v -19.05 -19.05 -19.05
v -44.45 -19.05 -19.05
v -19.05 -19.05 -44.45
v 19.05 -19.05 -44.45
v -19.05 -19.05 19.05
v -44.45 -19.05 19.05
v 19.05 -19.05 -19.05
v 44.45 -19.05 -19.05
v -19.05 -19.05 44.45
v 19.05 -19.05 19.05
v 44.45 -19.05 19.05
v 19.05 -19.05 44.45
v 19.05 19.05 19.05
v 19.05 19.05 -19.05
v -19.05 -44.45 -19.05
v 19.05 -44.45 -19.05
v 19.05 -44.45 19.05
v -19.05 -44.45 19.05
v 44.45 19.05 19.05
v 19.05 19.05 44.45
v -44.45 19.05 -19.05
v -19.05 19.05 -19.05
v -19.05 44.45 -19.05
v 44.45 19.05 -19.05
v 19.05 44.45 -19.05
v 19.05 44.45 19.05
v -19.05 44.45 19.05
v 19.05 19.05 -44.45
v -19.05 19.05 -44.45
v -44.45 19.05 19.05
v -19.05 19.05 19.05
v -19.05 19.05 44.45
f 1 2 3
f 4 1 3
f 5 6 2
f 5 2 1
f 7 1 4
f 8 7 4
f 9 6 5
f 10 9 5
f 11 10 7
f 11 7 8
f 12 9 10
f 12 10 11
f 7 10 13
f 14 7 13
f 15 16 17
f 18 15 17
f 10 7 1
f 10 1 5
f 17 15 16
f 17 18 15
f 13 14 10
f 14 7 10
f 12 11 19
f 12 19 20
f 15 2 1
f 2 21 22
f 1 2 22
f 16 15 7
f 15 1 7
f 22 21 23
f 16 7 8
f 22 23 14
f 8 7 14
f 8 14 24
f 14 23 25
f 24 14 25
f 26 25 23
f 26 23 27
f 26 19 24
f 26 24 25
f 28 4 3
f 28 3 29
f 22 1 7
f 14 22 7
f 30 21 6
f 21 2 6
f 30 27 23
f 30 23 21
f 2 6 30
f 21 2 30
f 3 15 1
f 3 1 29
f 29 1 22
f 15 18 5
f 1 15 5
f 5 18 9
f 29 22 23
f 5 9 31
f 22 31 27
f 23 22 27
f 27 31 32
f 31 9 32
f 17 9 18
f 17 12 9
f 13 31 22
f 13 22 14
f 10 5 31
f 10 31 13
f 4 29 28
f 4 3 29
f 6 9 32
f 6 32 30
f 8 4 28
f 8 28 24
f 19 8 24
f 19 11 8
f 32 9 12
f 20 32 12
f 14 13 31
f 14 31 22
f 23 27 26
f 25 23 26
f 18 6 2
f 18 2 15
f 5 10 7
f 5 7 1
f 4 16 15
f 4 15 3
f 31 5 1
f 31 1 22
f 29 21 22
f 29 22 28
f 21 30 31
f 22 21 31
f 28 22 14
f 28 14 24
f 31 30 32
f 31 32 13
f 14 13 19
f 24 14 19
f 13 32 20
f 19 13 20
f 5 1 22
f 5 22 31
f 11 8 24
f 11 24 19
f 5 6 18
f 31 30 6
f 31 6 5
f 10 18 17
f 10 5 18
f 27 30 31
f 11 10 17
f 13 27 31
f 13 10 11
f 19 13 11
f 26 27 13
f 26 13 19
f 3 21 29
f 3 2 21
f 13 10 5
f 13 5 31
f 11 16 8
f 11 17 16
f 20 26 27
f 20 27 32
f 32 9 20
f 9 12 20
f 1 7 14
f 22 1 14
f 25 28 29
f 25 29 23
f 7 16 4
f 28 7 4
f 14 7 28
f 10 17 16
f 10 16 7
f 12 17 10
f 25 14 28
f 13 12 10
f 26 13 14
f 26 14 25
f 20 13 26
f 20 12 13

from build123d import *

# Parameters (mm, degrees)
F0_W     = 38.1
F0_H     = 25.4
F0_W_2   = 25.4
F0_H_2   = 38.1
F3_DEPTH = 19.05
F1_W     = 38.1
F1_H     = 25.4
F1_W_2   = 25.4
F1_H_2   = 38.1
F4_DEPTH = 19.05
F2_W     = 38.1
F2_H     = 25.4
F2_W_2   = 25.4
F2_H_2   = 38.1
F5_DEPTH = 19.05


with BuildPart() as f3:
    # F0 (on Front) → F3 (new body, symmetric)
    with BuildSketch(Plane.XZ):
        with Locations((0, 31.75)):
            Rectangle(F0_W, F0_H)
        Polygon((-19.05, 19.05), (-19.05, 44.45), (-44.45, 19.05), align=None)
        Polygon((44.45, 19.05), (19.05, 44.45), (19.05, 19.05), align=None)
        with Locations((-31.75, 0)):
            Rectangle(F0_W_2, F0_H_2)
        with Locations((31.75, 0)):
            Rectangle(F0_W_2, F0_H_2)
        with Locations((0, -31.75)):
            Rectangle(F0_W, F0_H)
        Polygon((-19.05, -44.45), (-19.05, -19.05), (-44.45, -19.05), align=None)
        Polygon((44.45, -19.05), (19.05, -19.05), (19.05, -44.45), align=None)
    extrude(amount=F3_DEPTH, both=True)


with BuildPart() as f4:
    # F1 (on Right) → F4 (new body, symmetric)
    with BuildSketch(Plane.YZ):
        with Locations((0, 31.75)):
            Rectangle(F1_W, F1_H)
        Polygon((44.45, 19.05), (19.05, 44.45), (19.05, 19.05), align=None)
        Polygon((-19.05, 19.05), (-19.05, 44.45), (-44.45, 19.05), align=None)
        with Locations((31.75, 0)):
            Rectangle(F1_W_2, F1_H_2)
        with Locations((-31.75, 0)):
            Rectangle(F1_W_2, F1_H_2)
        Polygon((44.45, -19.05), (19.05, -19.05), (19.05, -44.45), align=None)
        with Locations((0, -31.75)):
            Rectangle(F1_W, F1_H)
        Polygon((-19.05, -44.45), (-19.05, -19.05), (-44.45, -19.05), align=None)
    extrude(amount=F4_DEPTH, both=True)


with BuildPart() as f5:
    # F2 (on Top) → F5 (new body, symmetric)
    with BuildSketch(Plane.XY):
        with Locations((0, -31.75)):
            Rectangle(F2_W, F2_H)
        Polygon((-44.45, -19.05), (-19.05, -44.45), (-19.05, -19.05), align=None)
        Polygon((19.05, -19.05), (19.05, -44.45), (44.45, -19.05), align=None)
        with Locations((-31.75, 0)):
            Rectangle(F2_W_2, F2_H_2)
        with Locations((31.75, 0)):
            Rectangle(F2_W_2, F2_H_2)
        Polygon((-44.45, 19.05), (-19.05, 19.05), (-19.05, 44.45), align=None)
        with Locations((0, 31.75)):
            Rectangle(F2_W, F2_H)
        Polygon((19.05, 44.45), (19.05, 19.05), (44.45, 19.05), align=None)
    extrude(amount=F5_DEPTH, both=True)


solid = Compound([f3.part, f4.part, f5.part])
